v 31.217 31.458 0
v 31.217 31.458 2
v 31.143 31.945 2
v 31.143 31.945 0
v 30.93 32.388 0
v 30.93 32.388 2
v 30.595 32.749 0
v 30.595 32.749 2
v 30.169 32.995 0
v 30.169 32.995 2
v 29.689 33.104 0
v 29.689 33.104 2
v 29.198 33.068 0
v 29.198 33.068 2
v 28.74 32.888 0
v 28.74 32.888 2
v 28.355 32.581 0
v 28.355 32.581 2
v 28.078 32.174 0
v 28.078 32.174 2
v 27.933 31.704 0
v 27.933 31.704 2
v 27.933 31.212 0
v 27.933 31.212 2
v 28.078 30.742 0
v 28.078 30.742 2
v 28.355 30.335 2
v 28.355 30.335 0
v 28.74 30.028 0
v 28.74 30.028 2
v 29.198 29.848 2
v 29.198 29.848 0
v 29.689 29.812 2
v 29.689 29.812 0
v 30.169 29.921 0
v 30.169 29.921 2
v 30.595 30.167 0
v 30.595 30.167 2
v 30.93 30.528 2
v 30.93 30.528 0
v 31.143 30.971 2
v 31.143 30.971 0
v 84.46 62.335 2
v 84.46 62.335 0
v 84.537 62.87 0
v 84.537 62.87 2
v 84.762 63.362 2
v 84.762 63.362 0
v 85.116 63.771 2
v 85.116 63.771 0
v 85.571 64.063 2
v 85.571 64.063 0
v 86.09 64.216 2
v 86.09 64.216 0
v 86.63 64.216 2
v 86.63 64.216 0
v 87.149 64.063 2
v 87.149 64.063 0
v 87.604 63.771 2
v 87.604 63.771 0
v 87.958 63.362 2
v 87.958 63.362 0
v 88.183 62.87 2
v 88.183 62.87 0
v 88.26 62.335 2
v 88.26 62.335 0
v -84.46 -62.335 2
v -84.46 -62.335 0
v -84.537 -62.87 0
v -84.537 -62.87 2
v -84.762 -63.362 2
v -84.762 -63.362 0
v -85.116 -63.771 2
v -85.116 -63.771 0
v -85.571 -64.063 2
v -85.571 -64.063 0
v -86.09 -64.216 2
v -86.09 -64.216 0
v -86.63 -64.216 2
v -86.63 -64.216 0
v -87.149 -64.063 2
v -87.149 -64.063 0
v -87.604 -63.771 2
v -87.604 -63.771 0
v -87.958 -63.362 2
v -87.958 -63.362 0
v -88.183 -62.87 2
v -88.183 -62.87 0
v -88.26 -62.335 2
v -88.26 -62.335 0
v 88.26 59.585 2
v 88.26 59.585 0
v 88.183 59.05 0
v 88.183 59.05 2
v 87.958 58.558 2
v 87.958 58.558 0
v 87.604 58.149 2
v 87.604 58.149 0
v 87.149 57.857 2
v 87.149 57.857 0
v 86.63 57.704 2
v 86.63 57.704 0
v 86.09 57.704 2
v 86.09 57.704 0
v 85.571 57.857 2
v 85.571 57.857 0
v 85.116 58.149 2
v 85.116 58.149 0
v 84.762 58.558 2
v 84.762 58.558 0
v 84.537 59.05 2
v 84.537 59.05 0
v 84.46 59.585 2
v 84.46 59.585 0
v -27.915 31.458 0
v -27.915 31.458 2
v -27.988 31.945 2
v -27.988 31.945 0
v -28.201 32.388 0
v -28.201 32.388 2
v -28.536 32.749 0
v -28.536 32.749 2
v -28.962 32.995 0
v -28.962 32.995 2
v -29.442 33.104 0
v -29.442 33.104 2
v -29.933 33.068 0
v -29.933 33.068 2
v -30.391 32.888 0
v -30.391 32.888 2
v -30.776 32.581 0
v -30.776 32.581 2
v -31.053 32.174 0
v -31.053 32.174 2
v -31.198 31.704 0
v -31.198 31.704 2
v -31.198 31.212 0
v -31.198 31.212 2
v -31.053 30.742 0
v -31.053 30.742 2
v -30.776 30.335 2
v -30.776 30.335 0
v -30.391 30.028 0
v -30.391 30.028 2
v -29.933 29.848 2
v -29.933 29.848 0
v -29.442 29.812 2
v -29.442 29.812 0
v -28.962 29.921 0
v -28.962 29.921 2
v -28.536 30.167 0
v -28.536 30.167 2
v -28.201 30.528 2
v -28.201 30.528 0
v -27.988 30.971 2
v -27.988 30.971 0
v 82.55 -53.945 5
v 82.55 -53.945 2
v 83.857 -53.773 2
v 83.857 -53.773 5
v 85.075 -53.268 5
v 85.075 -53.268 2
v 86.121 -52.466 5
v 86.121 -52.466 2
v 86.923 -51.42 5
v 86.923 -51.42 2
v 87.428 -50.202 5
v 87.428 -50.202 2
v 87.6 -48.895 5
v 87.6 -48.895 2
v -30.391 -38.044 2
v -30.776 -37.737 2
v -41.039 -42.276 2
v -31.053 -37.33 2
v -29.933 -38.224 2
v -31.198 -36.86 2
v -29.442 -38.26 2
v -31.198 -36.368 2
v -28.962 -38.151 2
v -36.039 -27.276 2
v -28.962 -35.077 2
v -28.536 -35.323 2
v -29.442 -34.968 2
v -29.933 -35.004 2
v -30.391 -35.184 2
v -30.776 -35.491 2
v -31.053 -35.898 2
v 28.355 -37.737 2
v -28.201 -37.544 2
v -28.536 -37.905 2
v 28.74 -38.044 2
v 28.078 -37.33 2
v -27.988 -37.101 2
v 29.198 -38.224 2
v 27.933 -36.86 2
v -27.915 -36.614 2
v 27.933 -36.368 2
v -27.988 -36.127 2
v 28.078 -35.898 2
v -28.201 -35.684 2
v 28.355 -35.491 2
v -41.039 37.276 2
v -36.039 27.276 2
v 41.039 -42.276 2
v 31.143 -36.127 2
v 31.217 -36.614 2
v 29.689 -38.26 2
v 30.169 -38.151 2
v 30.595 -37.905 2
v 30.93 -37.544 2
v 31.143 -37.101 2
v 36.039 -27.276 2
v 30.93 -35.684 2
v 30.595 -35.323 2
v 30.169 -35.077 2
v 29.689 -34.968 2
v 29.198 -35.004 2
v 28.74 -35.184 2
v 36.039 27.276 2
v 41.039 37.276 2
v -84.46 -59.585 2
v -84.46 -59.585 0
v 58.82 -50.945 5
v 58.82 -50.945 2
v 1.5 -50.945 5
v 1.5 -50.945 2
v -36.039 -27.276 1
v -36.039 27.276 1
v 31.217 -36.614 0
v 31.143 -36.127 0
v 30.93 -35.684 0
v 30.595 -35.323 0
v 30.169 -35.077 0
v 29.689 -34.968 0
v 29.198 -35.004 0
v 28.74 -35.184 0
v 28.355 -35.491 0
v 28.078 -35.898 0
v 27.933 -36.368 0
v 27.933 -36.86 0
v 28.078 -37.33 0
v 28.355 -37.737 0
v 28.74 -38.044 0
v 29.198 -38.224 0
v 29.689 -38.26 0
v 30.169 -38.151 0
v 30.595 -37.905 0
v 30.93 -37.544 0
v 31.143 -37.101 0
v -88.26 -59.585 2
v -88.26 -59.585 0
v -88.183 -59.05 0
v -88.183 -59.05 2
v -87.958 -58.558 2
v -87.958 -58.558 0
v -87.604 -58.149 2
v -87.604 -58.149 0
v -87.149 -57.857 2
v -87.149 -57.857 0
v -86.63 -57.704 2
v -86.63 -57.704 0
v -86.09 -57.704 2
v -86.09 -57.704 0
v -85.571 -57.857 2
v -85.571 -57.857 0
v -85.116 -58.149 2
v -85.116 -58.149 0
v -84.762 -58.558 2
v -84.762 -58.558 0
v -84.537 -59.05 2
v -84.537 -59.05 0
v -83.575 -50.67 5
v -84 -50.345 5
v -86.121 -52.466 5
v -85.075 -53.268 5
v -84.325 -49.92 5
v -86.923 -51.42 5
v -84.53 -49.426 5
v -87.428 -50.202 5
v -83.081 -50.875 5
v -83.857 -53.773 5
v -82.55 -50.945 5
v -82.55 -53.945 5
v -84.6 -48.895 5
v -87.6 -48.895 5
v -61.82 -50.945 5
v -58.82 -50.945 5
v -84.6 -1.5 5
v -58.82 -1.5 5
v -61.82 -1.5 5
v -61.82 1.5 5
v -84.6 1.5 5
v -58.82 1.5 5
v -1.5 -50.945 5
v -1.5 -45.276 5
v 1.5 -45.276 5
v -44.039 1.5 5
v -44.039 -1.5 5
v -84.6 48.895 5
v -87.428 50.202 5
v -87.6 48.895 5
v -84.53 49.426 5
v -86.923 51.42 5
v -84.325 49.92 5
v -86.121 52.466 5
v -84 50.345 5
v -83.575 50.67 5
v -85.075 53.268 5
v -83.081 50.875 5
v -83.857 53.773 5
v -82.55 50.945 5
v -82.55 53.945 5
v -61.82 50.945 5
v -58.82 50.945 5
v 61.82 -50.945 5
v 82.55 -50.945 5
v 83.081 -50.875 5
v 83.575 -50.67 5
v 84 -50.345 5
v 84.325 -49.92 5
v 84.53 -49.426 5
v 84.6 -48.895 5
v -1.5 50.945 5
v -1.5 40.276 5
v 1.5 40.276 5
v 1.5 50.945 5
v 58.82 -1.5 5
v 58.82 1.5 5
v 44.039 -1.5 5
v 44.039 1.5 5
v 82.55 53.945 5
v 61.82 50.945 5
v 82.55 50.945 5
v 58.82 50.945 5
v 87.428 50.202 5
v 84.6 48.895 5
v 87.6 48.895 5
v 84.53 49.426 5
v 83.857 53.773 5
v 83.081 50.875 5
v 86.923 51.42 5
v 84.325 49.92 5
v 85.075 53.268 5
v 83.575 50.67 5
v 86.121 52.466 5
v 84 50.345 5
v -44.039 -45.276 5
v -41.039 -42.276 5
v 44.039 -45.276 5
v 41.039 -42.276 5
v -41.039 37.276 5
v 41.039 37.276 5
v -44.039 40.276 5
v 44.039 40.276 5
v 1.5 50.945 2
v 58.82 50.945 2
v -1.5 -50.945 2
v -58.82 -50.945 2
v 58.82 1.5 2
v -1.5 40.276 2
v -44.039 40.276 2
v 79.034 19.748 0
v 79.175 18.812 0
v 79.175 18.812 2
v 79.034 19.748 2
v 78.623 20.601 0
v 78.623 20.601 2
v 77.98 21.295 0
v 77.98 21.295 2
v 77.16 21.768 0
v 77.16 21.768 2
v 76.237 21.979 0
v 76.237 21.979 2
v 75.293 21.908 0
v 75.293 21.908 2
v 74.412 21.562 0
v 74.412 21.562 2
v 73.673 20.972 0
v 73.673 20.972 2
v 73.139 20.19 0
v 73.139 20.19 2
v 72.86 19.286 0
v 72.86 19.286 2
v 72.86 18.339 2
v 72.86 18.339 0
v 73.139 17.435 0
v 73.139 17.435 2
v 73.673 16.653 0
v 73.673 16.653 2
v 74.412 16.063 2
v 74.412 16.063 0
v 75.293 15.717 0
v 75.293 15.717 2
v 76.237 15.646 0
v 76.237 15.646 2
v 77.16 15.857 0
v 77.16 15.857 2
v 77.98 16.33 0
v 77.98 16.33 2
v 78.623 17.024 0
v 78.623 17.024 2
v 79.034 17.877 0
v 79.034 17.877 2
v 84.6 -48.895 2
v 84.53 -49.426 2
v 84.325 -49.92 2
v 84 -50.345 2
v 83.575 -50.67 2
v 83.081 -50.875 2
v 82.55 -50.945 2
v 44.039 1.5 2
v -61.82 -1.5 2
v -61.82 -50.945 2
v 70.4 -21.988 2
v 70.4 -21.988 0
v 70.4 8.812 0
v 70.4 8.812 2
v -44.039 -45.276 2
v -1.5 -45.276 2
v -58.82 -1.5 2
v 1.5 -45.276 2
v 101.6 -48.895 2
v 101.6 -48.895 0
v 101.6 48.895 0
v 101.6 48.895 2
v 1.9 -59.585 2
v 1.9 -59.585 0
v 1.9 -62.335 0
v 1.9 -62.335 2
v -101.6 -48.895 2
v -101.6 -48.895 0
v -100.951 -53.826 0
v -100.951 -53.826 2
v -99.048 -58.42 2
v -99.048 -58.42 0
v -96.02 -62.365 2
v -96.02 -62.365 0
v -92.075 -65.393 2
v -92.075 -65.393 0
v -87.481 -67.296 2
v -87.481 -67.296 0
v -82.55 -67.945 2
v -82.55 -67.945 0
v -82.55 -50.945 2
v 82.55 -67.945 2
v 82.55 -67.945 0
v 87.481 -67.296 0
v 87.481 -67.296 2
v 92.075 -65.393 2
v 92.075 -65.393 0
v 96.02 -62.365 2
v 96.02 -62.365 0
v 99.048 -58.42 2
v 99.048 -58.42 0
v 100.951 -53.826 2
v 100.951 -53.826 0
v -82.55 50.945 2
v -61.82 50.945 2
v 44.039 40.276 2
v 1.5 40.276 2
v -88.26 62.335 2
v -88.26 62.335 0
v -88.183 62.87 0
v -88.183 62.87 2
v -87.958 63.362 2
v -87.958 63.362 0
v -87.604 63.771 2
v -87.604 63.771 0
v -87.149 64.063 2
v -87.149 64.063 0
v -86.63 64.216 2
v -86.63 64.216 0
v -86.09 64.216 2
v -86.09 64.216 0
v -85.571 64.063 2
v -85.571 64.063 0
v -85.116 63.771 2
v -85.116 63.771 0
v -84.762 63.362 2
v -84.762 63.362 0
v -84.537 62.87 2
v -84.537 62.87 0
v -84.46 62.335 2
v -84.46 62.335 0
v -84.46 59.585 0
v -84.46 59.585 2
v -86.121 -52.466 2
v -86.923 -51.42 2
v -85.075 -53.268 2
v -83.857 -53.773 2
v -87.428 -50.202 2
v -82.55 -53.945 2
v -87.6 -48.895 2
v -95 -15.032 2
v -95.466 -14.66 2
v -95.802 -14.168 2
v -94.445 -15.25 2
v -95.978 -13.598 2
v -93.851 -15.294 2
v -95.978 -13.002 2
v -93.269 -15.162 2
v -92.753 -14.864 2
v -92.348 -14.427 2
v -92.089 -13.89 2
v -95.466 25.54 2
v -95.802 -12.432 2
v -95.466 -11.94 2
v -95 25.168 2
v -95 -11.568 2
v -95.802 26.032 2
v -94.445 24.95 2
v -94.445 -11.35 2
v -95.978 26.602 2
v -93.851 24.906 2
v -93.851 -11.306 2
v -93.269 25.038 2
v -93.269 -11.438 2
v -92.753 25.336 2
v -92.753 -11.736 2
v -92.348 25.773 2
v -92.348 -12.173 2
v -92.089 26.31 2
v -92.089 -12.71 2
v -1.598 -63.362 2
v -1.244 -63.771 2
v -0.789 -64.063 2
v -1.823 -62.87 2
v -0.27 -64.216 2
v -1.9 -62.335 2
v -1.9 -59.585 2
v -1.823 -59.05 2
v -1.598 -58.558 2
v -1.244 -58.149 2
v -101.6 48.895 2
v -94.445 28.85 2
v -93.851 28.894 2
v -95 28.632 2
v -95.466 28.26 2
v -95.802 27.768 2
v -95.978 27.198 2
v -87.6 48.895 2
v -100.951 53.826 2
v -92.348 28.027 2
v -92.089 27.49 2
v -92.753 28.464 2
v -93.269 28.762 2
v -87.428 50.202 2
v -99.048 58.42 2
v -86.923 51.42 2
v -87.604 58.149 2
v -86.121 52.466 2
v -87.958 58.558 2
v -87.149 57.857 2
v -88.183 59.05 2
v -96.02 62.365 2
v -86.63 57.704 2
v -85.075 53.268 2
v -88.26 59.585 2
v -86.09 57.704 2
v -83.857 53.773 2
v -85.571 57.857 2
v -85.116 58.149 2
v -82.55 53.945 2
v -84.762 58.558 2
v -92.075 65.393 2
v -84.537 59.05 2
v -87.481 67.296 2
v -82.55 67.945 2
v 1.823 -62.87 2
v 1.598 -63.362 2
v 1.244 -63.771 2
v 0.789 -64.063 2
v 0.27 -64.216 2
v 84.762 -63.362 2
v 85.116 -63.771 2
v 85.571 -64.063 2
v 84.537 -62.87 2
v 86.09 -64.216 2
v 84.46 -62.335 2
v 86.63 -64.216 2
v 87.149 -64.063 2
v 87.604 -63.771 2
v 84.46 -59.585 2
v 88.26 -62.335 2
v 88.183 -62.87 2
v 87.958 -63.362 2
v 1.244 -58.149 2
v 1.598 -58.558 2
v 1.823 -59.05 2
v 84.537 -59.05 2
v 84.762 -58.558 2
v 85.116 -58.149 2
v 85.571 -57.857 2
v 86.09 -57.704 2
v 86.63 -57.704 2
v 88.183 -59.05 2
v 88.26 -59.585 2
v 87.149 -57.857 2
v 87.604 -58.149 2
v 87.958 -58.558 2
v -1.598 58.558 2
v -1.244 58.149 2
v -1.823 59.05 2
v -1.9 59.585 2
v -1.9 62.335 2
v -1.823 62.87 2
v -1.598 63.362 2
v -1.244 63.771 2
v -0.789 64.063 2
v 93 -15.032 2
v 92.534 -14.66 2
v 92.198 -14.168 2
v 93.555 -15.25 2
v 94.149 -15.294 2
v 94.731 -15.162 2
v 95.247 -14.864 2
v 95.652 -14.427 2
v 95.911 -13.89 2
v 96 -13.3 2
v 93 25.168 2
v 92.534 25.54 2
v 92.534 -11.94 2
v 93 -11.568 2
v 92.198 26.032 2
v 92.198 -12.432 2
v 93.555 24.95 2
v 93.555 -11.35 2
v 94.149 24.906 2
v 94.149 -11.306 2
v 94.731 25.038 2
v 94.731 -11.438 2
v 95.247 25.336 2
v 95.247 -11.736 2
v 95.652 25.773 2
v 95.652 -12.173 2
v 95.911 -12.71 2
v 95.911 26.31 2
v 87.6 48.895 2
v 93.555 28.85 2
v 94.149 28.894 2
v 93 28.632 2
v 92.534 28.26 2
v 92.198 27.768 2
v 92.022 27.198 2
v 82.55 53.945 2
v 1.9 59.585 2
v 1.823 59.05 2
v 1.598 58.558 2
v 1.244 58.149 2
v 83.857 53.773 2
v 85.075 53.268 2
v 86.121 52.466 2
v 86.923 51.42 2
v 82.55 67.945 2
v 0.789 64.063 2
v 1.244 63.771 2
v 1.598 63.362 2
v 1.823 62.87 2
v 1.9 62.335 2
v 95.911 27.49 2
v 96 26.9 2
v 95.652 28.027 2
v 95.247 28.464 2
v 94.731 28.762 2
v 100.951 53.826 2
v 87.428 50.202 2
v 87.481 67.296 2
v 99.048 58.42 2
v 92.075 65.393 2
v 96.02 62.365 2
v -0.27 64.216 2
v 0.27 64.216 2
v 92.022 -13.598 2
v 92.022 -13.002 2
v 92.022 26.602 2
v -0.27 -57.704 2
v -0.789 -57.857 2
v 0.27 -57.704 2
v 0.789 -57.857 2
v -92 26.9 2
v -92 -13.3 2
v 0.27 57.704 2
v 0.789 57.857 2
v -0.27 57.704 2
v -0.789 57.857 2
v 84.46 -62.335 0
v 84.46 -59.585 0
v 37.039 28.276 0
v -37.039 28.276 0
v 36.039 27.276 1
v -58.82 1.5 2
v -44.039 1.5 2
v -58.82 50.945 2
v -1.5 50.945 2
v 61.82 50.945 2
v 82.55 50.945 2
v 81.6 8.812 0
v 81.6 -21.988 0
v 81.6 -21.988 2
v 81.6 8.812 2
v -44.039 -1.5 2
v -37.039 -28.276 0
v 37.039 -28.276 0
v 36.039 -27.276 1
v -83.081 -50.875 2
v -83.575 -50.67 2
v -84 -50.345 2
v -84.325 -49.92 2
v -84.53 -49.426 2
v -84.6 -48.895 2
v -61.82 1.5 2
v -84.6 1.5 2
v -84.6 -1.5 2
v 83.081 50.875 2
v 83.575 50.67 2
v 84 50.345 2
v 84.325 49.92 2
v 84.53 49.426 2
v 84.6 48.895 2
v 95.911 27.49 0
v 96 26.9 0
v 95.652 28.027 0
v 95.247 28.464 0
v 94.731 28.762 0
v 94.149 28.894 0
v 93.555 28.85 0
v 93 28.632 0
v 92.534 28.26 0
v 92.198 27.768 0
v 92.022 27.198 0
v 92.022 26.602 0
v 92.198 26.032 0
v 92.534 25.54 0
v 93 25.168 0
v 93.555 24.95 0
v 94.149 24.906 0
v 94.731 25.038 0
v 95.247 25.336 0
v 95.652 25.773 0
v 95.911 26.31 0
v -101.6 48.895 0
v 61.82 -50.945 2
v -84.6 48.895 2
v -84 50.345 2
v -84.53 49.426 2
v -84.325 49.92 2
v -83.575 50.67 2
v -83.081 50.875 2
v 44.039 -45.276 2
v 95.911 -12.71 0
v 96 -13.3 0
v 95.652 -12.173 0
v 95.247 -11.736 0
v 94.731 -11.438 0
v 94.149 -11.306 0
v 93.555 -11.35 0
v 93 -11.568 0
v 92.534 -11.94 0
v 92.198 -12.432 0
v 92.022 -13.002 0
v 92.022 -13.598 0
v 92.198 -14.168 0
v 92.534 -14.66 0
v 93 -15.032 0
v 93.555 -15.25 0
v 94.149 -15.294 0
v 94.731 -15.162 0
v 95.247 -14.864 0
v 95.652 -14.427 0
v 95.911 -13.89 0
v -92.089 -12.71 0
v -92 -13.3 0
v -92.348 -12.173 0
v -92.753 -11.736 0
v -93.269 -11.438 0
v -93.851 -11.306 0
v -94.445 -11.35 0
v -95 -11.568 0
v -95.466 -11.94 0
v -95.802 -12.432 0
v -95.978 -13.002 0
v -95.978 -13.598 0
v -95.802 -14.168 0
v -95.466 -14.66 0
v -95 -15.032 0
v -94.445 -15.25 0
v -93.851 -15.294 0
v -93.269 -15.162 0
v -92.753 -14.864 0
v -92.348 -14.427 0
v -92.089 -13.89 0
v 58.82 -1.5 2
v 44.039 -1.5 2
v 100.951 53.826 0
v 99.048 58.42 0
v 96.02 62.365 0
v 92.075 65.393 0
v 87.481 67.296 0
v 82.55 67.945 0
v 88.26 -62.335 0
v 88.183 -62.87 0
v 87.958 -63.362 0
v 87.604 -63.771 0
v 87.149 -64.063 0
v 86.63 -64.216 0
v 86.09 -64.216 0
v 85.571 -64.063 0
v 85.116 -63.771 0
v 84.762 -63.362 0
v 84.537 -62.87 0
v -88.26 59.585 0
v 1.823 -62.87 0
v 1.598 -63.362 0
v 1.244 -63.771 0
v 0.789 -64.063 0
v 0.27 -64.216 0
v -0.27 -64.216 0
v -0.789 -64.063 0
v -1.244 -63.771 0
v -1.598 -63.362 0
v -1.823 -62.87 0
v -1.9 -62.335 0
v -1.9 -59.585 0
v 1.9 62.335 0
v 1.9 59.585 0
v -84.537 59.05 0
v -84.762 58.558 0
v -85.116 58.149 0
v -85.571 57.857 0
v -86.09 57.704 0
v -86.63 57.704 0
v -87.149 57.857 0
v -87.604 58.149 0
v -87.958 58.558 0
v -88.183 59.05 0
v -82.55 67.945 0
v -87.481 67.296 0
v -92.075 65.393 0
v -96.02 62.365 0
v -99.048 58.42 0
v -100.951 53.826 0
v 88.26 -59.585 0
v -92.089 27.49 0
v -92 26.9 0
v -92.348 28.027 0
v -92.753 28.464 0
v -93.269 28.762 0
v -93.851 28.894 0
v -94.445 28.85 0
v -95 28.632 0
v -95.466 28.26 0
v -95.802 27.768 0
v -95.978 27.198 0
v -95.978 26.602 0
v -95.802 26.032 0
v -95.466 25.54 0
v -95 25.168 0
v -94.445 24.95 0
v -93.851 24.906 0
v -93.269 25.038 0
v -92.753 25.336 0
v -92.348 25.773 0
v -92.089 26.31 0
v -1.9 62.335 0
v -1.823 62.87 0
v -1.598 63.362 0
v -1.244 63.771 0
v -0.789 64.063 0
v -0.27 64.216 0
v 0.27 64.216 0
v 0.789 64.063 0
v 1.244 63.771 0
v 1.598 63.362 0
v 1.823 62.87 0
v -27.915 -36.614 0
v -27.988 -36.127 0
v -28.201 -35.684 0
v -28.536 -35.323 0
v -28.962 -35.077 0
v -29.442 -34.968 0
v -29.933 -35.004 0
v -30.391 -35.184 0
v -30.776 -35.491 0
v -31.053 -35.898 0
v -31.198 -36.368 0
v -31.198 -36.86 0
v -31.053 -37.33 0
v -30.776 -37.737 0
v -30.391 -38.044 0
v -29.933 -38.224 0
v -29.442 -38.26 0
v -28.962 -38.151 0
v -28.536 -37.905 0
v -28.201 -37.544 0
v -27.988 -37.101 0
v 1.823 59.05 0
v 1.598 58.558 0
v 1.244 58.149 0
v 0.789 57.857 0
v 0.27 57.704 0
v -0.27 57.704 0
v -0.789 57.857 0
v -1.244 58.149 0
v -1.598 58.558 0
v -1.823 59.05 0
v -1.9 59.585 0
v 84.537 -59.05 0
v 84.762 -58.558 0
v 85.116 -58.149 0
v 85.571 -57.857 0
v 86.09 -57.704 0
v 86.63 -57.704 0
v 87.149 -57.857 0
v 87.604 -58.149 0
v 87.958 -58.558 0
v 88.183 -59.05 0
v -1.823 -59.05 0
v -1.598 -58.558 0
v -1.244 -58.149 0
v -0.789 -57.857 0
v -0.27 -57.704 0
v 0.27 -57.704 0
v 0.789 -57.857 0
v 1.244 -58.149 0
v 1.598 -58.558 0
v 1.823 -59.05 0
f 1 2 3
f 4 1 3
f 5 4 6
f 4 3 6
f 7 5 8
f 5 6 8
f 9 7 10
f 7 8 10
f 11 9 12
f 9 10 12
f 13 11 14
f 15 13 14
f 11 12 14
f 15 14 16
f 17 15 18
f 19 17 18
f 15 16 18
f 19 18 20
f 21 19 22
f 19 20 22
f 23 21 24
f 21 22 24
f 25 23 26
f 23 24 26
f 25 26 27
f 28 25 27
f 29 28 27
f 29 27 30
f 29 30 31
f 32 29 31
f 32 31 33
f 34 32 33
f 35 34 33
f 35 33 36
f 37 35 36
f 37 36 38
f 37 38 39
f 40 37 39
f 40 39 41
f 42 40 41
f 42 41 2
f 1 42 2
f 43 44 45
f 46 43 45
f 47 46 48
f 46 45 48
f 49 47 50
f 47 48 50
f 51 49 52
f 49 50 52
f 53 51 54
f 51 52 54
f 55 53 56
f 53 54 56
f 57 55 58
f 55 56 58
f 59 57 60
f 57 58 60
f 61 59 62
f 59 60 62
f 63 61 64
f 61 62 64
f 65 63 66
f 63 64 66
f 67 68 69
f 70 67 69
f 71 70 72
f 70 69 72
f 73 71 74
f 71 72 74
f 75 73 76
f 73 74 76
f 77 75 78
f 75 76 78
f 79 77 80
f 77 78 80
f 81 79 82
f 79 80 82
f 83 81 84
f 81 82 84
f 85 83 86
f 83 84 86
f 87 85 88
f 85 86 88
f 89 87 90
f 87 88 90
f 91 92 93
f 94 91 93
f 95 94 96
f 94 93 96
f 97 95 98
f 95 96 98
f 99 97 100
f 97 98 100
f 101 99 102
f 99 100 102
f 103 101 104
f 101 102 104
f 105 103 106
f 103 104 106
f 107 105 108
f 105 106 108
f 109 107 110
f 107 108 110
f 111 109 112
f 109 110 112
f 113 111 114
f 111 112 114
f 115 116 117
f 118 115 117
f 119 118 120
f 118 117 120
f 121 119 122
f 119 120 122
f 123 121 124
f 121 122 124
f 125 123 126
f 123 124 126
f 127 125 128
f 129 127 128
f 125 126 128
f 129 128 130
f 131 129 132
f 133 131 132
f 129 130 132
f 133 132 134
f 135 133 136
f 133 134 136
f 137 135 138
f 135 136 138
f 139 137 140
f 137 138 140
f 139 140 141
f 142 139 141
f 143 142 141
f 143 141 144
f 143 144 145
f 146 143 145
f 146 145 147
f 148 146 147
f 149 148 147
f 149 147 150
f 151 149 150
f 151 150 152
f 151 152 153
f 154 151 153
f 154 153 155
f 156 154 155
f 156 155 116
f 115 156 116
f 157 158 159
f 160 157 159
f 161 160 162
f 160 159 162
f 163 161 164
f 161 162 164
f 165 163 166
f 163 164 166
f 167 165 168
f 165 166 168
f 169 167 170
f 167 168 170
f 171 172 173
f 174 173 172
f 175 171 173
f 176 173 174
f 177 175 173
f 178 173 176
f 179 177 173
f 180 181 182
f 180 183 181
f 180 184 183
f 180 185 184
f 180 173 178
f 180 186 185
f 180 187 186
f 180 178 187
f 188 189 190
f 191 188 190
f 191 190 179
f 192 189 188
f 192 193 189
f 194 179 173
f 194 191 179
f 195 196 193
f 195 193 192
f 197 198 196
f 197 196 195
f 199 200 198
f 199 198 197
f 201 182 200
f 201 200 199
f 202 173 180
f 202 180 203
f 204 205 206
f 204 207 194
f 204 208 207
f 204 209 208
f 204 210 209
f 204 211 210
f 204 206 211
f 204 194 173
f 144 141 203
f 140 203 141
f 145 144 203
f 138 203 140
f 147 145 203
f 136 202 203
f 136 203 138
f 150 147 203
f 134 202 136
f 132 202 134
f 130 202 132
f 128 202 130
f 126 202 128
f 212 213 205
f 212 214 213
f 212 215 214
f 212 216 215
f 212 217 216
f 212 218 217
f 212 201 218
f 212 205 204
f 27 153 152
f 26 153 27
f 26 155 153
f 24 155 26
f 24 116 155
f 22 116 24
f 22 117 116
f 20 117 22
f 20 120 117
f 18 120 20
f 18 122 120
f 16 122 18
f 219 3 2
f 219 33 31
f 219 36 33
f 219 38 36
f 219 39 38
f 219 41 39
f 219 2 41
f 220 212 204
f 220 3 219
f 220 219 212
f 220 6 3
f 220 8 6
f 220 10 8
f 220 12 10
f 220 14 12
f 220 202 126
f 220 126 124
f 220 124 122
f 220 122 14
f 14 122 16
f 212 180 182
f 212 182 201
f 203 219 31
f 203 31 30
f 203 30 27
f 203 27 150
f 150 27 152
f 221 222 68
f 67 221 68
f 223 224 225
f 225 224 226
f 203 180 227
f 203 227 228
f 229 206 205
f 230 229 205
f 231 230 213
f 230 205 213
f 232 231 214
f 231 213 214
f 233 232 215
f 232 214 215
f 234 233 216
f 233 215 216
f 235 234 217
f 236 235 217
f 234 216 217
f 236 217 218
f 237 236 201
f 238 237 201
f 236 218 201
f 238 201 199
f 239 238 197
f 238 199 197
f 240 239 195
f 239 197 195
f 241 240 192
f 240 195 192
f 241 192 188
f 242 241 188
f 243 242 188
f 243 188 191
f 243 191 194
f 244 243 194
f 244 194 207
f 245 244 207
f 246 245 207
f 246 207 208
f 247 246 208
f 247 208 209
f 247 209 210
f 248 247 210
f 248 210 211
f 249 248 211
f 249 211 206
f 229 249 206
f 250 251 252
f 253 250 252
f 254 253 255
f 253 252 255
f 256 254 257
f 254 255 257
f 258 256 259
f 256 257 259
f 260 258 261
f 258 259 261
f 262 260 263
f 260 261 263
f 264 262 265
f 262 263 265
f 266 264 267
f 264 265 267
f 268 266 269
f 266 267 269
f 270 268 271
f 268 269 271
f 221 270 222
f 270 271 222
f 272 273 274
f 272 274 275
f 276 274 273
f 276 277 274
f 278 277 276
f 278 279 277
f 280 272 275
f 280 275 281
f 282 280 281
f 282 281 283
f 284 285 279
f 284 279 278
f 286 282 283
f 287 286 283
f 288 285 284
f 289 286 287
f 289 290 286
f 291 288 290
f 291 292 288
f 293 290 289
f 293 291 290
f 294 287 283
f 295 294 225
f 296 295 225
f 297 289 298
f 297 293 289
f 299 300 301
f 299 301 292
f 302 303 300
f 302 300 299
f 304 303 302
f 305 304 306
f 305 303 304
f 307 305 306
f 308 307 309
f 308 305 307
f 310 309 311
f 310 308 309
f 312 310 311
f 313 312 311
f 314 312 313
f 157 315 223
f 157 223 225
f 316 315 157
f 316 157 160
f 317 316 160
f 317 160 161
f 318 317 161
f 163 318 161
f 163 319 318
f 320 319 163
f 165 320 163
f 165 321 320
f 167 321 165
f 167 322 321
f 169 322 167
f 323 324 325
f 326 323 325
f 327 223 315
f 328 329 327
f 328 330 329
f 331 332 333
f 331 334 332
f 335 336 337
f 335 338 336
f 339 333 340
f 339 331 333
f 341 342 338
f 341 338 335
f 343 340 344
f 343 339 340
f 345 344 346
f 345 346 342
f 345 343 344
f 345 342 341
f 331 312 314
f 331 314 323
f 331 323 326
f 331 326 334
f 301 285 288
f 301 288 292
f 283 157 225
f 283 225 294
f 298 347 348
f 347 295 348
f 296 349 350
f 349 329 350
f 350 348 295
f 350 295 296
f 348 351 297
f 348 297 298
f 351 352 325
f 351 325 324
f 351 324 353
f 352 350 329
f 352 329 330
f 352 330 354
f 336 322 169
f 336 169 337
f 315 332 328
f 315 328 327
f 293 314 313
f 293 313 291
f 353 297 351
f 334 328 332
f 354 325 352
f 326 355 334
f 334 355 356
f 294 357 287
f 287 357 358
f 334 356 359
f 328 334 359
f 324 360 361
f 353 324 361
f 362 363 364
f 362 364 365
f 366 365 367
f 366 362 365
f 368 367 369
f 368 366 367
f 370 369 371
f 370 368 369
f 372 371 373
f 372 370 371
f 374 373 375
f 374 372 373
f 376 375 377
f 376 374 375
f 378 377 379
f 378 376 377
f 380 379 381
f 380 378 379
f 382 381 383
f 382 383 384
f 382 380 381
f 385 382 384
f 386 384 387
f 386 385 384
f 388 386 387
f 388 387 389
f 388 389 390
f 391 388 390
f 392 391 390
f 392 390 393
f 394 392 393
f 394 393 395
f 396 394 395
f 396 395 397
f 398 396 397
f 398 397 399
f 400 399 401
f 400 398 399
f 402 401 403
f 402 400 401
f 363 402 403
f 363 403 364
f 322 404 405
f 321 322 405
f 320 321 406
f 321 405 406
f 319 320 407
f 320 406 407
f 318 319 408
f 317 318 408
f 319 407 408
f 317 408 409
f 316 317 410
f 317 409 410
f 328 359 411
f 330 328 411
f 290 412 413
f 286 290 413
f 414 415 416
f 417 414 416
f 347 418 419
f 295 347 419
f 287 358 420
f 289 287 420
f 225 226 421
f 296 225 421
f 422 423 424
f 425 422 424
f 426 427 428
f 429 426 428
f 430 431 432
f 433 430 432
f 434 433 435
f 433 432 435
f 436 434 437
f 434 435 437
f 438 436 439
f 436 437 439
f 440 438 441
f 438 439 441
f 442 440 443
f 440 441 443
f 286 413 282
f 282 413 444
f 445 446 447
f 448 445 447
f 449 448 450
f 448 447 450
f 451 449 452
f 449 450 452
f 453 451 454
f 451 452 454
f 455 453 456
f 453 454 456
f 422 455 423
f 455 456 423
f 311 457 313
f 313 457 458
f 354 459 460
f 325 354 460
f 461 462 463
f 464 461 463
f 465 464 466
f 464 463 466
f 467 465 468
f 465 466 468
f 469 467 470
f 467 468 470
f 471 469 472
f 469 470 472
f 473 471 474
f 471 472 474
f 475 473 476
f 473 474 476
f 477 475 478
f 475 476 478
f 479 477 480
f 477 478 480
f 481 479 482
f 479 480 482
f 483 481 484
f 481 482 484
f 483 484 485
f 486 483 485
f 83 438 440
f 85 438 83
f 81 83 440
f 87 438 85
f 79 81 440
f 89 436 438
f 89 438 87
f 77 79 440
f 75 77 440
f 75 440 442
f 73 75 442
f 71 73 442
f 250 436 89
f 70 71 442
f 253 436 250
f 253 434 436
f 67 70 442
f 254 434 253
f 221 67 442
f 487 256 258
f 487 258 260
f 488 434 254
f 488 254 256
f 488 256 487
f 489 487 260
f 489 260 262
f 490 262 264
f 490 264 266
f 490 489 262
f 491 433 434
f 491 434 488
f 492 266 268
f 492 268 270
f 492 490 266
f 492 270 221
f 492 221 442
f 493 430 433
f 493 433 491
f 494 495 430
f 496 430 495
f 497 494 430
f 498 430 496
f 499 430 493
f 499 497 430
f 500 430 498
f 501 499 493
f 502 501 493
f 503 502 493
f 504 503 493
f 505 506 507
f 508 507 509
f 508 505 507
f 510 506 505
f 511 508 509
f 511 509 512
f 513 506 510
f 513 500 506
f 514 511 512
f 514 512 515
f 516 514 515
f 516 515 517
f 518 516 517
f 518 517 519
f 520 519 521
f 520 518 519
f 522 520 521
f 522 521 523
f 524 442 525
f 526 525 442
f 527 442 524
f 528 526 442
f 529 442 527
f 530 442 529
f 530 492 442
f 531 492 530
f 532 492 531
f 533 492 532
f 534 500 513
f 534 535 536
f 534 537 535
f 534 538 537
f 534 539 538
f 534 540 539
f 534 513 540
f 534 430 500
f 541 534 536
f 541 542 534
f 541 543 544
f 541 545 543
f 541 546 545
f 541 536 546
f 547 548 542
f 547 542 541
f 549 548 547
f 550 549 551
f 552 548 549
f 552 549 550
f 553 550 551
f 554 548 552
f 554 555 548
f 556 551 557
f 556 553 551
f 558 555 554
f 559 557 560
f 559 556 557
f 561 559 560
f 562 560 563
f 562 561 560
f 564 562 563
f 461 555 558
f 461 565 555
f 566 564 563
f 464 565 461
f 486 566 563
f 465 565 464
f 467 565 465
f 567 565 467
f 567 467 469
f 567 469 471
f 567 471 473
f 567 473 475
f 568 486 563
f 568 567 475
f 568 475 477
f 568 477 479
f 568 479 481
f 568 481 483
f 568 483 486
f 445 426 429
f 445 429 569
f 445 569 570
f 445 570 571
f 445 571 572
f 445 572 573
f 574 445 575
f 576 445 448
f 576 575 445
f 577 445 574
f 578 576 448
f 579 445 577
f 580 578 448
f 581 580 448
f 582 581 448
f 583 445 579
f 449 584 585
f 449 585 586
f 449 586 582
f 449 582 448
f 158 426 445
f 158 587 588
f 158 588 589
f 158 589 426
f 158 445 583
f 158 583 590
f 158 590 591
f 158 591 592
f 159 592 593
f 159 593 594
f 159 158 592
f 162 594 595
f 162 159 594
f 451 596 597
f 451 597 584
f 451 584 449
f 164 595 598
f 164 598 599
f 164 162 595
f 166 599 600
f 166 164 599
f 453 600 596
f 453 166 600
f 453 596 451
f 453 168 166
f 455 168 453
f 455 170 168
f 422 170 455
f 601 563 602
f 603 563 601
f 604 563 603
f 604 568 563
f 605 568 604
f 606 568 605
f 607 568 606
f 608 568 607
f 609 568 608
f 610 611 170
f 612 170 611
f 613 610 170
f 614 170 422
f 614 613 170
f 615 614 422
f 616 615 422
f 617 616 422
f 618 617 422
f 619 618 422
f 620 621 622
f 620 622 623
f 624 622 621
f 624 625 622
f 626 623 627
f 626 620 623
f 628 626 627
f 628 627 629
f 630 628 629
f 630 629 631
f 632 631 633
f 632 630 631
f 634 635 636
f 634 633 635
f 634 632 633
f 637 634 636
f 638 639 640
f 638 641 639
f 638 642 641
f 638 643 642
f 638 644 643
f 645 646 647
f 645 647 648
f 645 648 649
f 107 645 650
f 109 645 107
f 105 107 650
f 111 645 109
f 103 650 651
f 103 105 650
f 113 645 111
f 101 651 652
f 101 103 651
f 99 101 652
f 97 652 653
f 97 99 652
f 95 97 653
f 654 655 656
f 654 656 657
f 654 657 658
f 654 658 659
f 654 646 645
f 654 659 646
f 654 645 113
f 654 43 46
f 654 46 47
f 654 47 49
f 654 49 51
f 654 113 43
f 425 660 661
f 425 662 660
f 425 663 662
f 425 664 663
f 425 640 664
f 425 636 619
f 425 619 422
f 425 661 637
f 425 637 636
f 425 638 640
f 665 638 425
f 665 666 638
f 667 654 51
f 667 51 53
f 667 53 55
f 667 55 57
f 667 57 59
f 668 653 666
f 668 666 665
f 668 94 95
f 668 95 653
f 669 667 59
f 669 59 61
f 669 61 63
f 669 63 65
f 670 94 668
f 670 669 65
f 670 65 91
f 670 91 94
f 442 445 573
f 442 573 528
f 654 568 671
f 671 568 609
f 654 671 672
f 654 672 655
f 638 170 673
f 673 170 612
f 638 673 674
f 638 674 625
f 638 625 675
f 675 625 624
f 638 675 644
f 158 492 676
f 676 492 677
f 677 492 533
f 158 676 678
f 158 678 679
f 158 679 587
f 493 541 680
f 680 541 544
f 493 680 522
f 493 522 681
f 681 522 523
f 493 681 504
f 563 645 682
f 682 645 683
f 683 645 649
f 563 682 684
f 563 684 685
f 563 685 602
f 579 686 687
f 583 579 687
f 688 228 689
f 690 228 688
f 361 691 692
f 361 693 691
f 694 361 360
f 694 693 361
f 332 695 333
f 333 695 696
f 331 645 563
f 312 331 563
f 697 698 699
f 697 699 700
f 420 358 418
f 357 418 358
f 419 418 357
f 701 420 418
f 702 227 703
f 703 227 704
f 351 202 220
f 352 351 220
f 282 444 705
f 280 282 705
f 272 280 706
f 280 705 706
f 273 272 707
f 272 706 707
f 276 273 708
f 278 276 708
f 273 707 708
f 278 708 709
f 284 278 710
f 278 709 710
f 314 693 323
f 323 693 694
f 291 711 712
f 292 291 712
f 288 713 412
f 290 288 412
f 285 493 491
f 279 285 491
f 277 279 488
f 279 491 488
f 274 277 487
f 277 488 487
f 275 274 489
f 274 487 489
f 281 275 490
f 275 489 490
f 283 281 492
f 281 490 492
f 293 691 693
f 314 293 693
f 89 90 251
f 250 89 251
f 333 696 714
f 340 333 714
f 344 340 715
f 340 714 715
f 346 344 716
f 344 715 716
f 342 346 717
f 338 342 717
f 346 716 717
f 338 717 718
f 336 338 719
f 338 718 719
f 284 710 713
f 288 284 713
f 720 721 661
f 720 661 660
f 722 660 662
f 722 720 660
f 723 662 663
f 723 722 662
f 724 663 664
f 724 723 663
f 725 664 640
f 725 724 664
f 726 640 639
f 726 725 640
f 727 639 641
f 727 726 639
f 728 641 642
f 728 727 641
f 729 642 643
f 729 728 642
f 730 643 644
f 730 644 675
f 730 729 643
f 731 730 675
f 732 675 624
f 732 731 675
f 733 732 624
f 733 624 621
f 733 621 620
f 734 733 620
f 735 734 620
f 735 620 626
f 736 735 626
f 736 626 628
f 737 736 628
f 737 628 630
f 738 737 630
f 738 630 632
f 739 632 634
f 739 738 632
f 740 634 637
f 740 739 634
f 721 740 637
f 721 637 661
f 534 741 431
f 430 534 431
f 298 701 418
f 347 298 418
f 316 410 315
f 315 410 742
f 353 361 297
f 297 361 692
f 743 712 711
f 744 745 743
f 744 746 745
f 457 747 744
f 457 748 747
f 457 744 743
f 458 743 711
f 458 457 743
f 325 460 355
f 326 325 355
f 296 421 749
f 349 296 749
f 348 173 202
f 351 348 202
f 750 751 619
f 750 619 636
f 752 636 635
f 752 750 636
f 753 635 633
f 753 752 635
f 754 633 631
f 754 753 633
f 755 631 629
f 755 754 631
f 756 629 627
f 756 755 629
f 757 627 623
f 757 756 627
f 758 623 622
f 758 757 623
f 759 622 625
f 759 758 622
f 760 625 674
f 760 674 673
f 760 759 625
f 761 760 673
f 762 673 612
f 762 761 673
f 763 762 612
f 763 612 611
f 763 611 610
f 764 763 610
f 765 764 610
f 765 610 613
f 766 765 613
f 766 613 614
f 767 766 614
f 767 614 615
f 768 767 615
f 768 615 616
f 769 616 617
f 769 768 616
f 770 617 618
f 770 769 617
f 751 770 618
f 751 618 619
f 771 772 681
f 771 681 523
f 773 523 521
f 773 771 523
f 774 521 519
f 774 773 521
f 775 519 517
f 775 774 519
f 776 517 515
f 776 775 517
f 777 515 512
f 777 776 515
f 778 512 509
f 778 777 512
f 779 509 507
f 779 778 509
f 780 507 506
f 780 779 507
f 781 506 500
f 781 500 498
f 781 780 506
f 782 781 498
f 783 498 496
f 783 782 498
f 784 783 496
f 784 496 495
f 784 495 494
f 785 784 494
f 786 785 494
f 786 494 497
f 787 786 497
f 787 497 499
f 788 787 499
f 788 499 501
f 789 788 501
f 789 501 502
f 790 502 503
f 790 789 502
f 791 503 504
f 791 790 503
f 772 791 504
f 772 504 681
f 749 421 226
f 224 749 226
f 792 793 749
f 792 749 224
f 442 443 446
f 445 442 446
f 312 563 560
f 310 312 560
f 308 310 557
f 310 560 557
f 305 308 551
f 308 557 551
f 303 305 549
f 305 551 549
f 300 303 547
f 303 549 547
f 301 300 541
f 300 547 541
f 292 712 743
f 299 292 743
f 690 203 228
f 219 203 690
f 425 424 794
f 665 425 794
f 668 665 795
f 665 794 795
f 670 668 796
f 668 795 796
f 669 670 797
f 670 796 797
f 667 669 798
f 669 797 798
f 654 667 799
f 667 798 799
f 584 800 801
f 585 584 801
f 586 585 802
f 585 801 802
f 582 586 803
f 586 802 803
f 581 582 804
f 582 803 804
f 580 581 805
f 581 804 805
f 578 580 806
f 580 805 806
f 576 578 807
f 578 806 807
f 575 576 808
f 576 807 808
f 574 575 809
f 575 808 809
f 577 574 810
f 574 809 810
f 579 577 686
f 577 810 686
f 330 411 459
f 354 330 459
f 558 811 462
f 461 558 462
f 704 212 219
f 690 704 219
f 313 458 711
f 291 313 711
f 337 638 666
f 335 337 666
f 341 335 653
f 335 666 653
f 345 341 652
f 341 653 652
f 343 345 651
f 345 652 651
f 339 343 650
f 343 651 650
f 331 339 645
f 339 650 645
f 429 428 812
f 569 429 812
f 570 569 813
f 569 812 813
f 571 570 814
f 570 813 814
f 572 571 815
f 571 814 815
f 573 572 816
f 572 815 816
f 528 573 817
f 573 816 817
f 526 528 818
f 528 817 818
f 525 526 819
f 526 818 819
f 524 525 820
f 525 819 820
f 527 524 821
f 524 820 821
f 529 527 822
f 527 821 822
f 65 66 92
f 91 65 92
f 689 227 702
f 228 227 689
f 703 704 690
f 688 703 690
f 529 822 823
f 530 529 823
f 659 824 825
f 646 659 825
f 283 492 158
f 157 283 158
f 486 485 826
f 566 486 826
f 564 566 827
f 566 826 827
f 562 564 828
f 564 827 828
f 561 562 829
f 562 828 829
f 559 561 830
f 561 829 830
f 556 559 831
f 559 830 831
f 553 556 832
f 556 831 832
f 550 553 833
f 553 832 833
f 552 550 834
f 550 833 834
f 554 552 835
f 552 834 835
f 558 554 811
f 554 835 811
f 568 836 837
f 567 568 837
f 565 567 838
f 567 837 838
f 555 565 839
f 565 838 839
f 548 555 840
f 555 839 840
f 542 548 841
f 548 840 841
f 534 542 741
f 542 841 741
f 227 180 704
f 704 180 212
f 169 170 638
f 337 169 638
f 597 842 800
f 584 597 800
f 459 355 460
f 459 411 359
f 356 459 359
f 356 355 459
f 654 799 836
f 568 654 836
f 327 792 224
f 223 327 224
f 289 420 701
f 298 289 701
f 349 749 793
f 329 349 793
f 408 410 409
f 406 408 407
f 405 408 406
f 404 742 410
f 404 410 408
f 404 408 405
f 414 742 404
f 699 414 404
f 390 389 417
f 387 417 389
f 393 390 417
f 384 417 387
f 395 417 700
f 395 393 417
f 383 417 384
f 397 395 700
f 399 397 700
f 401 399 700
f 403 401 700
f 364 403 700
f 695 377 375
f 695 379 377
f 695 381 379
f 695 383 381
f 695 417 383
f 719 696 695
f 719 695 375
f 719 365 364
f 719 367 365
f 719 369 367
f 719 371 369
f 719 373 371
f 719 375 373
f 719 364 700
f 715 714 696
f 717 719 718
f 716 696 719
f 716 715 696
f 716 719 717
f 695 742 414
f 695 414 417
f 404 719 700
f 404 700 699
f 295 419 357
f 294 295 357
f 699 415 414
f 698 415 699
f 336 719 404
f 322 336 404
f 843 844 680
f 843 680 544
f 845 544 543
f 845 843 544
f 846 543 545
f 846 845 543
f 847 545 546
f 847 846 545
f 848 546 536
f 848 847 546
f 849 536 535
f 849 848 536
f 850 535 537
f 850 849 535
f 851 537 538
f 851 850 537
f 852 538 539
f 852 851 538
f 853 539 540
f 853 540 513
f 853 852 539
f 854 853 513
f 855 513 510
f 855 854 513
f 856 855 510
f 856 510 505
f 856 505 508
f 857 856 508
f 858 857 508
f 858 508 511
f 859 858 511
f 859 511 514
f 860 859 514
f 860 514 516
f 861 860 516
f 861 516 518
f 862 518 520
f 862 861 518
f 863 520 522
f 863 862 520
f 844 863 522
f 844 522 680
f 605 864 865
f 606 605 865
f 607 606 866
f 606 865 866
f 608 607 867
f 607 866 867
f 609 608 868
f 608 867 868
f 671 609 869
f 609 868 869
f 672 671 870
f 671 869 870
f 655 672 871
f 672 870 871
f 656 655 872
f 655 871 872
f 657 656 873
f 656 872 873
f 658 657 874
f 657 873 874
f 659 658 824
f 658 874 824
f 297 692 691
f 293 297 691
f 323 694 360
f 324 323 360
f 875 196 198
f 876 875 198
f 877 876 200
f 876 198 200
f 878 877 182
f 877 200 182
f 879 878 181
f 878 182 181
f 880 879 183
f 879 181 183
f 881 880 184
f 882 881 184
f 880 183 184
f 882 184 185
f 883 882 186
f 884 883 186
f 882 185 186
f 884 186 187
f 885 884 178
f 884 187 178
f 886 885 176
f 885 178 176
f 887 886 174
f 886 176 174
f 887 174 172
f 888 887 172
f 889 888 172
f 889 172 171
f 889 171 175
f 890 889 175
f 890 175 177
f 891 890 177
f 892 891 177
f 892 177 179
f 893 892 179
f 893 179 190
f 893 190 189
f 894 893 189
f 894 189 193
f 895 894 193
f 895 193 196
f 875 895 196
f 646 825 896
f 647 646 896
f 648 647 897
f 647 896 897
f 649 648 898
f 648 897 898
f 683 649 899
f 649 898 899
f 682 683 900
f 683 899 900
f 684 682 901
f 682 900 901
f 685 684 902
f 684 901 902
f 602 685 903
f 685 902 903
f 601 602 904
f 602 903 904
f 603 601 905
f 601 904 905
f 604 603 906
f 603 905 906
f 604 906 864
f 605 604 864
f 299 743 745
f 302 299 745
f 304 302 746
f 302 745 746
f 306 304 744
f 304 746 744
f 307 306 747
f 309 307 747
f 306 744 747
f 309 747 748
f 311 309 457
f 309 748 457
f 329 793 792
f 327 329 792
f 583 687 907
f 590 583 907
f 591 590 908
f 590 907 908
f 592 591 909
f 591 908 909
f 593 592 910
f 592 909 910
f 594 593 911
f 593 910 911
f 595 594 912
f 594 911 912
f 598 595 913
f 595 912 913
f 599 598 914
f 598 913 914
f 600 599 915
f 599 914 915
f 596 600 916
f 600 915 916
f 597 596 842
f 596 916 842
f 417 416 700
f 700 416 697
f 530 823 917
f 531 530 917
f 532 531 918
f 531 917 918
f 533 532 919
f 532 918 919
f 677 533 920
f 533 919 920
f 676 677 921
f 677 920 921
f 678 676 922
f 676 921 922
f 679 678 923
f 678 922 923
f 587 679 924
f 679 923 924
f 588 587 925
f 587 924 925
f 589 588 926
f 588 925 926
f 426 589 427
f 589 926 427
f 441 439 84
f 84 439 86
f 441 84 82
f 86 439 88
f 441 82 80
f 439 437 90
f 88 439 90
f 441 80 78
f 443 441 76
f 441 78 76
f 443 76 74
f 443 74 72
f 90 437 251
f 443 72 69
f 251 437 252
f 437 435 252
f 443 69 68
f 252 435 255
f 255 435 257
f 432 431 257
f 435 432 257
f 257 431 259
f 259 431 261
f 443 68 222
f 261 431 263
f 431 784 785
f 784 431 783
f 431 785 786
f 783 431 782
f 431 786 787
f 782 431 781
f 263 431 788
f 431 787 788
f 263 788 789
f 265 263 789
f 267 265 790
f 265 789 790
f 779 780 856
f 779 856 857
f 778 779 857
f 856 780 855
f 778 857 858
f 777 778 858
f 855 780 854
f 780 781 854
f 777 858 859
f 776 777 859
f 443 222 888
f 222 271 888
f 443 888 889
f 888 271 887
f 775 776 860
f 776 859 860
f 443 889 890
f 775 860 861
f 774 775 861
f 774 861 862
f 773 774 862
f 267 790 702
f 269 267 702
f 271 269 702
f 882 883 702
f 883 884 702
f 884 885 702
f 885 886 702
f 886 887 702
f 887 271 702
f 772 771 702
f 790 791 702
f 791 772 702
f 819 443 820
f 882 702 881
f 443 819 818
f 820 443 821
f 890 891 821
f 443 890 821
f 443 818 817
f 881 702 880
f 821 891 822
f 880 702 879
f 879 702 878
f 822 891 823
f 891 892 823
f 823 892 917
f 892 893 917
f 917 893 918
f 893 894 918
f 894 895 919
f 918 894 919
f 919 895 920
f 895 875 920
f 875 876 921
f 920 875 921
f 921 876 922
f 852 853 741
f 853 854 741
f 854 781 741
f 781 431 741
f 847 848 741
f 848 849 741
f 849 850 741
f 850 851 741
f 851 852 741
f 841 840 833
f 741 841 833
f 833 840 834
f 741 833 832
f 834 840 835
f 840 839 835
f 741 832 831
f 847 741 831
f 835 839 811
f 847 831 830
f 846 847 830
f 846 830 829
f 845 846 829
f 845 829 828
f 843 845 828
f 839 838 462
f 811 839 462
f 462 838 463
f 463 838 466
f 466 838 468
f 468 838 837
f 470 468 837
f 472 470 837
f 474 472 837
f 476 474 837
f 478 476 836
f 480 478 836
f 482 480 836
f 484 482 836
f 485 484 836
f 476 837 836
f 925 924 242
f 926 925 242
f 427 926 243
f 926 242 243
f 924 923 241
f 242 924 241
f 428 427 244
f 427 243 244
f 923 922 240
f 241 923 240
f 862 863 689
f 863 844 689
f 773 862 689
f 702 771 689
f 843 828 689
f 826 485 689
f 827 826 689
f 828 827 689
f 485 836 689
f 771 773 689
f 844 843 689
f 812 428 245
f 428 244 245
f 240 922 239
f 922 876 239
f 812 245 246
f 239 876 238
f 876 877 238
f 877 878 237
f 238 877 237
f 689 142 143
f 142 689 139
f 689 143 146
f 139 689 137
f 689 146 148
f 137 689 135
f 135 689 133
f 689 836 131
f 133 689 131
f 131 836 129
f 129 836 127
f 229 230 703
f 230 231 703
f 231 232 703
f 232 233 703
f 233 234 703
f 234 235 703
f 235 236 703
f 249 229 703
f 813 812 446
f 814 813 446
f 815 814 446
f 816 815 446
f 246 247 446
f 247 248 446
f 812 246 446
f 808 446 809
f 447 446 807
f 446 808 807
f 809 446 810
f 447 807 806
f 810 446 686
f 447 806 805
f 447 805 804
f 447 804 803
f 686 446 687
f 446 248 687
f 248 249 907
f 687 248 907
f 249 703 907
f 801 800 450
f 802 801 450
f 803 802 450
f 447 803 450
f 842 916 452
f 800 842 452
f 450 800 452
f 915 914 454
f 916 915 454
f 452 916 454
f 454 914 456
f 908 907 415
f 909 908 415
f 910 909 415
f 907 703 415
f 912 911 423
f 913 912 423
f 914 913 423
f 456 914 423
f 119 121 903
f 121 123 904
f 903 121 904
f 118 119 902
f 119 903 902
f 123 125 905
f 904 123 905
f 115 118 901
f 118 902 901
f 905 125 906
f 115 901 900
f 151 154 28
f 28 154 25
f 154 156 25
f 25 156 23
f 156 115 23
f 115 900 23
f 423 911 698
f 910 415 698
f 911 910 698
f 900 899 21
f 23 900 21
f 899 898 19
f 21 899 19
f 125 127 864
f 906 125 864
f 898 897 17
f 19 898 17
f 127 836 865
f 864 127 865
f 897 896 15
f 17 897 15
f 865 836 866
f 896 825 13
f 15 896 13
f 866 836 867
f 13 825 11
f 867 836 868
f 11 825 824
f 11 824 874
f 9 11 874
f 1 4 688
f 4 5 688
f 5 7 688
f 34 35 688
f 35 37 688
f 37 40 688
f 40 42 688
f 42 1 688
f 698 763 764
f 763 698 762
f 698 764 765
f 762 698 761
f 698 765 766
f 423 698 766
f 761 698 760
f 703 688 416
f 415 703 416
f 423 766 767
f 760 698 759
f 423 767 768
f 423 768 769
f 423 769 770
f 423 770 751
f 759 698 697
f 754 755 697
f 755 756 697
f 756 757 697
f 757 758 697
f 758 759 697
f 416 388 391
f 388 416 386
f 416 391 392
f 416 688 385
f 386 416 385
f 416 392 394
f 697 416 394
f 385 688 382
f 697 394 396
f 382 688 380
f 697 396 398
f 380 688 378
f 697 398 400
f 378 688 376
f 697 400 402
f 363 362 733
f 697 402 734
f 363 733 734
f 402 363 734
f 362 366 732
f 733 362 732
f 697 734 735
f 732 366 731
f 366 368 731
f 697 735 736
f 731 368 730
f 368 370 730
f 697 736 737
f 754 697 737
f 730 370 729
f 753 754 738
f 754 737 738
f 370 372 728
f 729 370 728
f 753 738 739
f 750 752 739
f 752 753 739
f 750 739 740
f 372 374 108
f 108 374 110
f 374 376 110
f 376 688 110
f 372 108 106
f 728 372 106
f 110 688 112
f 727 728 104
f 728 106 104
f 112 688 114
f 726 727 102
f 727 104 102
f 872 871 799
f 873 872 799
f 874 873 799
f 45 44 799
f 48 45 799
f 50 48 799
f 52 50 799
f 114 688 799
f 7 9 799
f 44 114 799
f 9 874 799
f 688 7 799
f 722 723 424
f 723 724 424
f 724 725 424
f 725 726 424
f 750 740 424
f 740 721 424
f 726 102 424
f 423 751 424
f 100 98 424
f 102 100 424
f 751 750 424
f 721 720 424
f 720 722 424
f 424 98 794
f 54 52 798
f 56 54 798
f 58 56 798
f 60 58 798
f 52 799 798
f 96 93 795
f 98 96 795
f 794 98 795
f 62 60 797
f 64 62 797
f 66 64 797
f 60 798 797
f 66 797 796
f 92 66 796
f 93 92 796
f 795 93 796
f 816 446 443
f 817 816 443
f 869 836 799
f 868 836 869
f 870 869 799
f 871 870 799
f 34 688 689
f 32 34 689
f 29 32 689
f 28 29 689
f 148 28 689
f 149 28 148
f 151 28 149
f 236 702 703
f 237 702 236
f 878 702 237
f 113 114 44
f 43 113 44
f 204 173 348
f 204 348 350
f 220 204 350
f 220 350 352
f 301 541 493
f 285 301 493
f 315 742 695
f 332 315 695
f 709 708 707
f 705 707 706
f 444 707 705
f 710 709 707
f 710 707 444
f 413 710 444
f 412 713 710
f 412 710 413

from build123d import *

# Parameters (mm, degrees)
F0_R     = 2
F0_W     = 11.2
F0_H     = 30.8
F0_R_2   = 3.175
F1_DEPTH = 2
F2_W     = 72.0786
F2_H     = 54.5526
F2_R     = 1.651
F3_DEPTH = 2.001
F4_SIZE  = 1
F5_W     = 82.0786
F5_H     = 79.5526
F6_DEPTH = 3


with BuildPart() as f1:
    # F0 (on Top) → F1 (new body)
    with BuildSketch(Plane.XY):
        with BuildLine():
            Line((-82.55, -67.945), (82.55, -67.945))
            ThreePointArc((82.55, -67.945), (96.020384, -62.365384), (101.6, -48.895))
            Line((101.6, -48.895), (101.6, 48.895))
            ThreePointArc((101.6, 48.895), (96.020384, 62.365384), (82.55, 67.945))
            Line((82.55, 67.945), (-82.55, 67.945))
            ThreePointArc((-82.55, 67.945), (-96.020384, 62.365384), (-101.6, 48.895))
            Line((-101.6, 48.895), (-101.6, -48.895))
            ThreePointArc((-101.6, -48.895), (-96.020384, -62.365384), (-82.55, -67.945))
        make_face()
        with BuildLine():
            Line((-84.46, -59.585), (-84.46, -62.335))
            ThreePointArc((-84.46, -62.335), (-86.36, -64.235), (-88.26, -62.335))
            Line((-88.26, -62.335), (-88.26, -59.585))
            ThreePointArc((-88.26, -59.585), (-86.36, -57.685), (-84.46, -59.585))
        make_face(mode=Mode.SUBTRACT)
        with BuildLine():
            Line((1.9, -59.585), (1.9, -62.335))
            ThreePointArc((1.9, -62.335), (0, -64.235), (-1.9, -62.335))
            Line((-1.9, -62.335), (-1.9, -59.585))
            ThreePointArc((-1.9, -59.585), (0, -57.685), (1.9, -59.585))
        make_face(mode=Mode.SUBTRACT)
        with Locations((-94, -13.3)):
            Circle(F0_R, mode=Mode.SUBTRACT)
        with BuildLine():
            Line((88.26, -59.585), (88.26, -62.335))
            ThreePointArc((88.26, -62.335), (86.36, -64.235), (84.46, -62.335))
            Line((84.46, -62.335), (84.46, -59.585))
            ThreePointArc((84.46, -59.585), (86.36, -57.685), (88.26, -59.585))
        make_face(mode=Mode.SUBTRACT)
        with Locations((76, -6.5875)):
            Rectangle(F0_W, F0_H, mode=Mode.SUBTRACT)
        with Locations((94, -13.3)):
            Circle(F0_R, mode=Mode.SUBTRACT)
        with Locations((-94, 26.9)):
            Circle(F0_R, mode=Mode.SUBTRACT)
        with BuildLine():
            Line((-84.46, 62.335), (-84.46, 59.585))
            ThreePointArc((-84.46, 59.585), (-86.36, 57.685), (-88.26, 59.585))
            Line((-88.26, 59.585), (-88.26, 62.335))
            ThreePointArc((-88.26, 62.335), (-86.36, 64.235), (-84.46, 62.335))
        make_face(mode=Mode.SUBTRACT)
        with BuildLine():
            Line((1.9, 62.335), (1.9, 59.585))
            ThreePointArc((1.9, 59.585), (0, 57.685), (-1.9, 59.585))
            Line((-1.9, 59.585), (-1.9, 62.335))
            ThreePointArc((-1.9, 62.335), (0, 64.235), (1.9, 62.335))
        make_face(mode=Mode.SUBTRACT)
        with Locations((76, 18.8125)):
            Circle(F0_R_2, mode=Mode.SUBTRACT)
        with Locations((94, 26.9)):
            Circle(F0_R, mode=Mode.SUBTRACT)
        with BuildLine():
            Line((88.26, 62.335), (88.26, 59.585))
            ThreePointArc((88.26, 59.585), (86.36, 57.685), (84.46, 59.585))
            Line((84.46, 59.585), (84.46, 62.335))
            ThreePointArc((84.46, 62.335), (86.36, 64.235), (88.26, 62.335))
        make_face(mode=Mode.SUBTRACT)
    extrude(amount=F1_DEPTH)

    # F2 (on face) → F3 (cut, through all)
    with BuildSketch(Plane.XY.offset(2)):
        Rectangle(F2_W, F2_H)
        with Locations((-29.5656, 31.4579)):
            Circle(F2_R)
        with Locations((29.5656, 31.4579)):
            Circle(F2_R)
        with Locations((29.5656, -36.6141)):
            Circle(F2_R)
        with Locations((-29.5656, -36.6141)):
            Circle(F2_R)
    extrude(amount=-F3_DEPTH, mode=Mode.SUBTRACT)

    # F4
    f4_edges = [f1.edges().sort_by_distance(p)[0] for p in [
        (0, 27.2763, 0),
        (36.0393, 0, 0),
        (-36.0393, 0, 0),
        (0, -27.2763, 0),
    ]]
    chamfer(f4_edges, length=F4_SIZE)

    # F5 (on face) → F6 (join)
    with BuildSketch(Plane.XY.offset(2)):
        with BuildLine():
            Line((87.6, -48.895), (87.6, 48.895))
            ThreePointArc((87.6, 48.895), (86.120889, 52.465889), (82.55, 53.945))
            Line((82.55, 53.945), (-82.55, 53.945))
            ThreePointArc((-82.55, 53.945), (-86.120889, 52.465889), (-87.6, 48.895))
            Line((-87.6, 48.895), (-87.6, -48.895))
            ThreePointArc((-87.6, -48.895), (-86.120889, -52.465889), (-82.55, -53.945))
            Line((-82.55, -53.945), (82.55, -53.945))
            ThreePointArc((82.55, -53.945), (86.120889, -52.465889), (87.6, -48.895))
        make_face()
        with BuildLine():
            ThreePointArc((-82.55, -50.945), (-83.999569, -50.344569), (-84.6, -48.895))
            Line((-84.6, -48.895), (-84.6, -1.5))
            Line((-84.6, -1.5), (-61.81965, -1.5))
            Line((-61.81965, -1.5), (-61.81965, -50.945))
            Line((-61.81965, -50.945), (-82.55, -50.945))
        make_face(mode=Mode.SUBTRACT)
        Polygon((-44.0393, -1.5), (-44.0393, -45.2763), (-1.5, -45.2763), (-1.5, -50.945), (-58.81965, -50.945), (-58.81965, -1.5), align=None, mode=Mode.SUBTRACT)
        Polygon((58.81965, -1.5), (58.81965, -50.945), (1.5, -50.945), (1.5, -45.2763), (44.0393, -45.2763), (44.0393, -1.5), align=None, mode=Mode.SUBTRACT)
        with Locations((0, -2.5)):
            Rectangle(F5_W, F5_H, mode=Mode.SUBTRACT)
        with BuildLine():
            ThreePointArc((-84.6, 48.895), (-83.999569, 50.344569), (-82.55, 50.945))
            Line((-82.55, 50.945), (-61.81965, 50.945))
            Line((-61.81965, 50.945), (-61.81965, 1.5))
            Line((-61.81965, 1.5), (-84.6, 1.5))
            Line((-84.6, 1.5), (-84.6, 48.895))
        make_face(mode=Mode.SUBTRACT)
        Polygon((-58.81965, 1.5), (-58.81965, 50.945), (-1.5, 50.945), (-1.5, 40.2763), (-44.0393, 40.2763), (-44.0393, 1.5), align=None, mode=Mode.SUBTRACT)
        Polygon((1.5, 50.945), (58.81965, 50.945), (58.81965, 1.5), (44.0393, 1.5), (44.0393, 40.2763), (1.5, 40.2763), align=None, mode=Mode.SUBTRACT)
        with BuildLine():
            ThreePointArc((82.55, 50.945), (83.999569, 50.344569), (84.6, 48.895))
            Line((84.6, 48.895), (84.6, -48.895))
            ThreePointArc((84.6, -48.895), (83.999569, -50.344569), (82.55, -50.945))
            Line((82.55, -50.945), (61.81965, -50.945))
            Line((61.81965, -50.945), (61.81965, 50.945))
            Line((61.81965, 50.945), (82.55, 50.945))
        make_face(mode=Mode.SUBTRACT)
    extrude(amount=F6_DEPTH)


solid = f1.part
